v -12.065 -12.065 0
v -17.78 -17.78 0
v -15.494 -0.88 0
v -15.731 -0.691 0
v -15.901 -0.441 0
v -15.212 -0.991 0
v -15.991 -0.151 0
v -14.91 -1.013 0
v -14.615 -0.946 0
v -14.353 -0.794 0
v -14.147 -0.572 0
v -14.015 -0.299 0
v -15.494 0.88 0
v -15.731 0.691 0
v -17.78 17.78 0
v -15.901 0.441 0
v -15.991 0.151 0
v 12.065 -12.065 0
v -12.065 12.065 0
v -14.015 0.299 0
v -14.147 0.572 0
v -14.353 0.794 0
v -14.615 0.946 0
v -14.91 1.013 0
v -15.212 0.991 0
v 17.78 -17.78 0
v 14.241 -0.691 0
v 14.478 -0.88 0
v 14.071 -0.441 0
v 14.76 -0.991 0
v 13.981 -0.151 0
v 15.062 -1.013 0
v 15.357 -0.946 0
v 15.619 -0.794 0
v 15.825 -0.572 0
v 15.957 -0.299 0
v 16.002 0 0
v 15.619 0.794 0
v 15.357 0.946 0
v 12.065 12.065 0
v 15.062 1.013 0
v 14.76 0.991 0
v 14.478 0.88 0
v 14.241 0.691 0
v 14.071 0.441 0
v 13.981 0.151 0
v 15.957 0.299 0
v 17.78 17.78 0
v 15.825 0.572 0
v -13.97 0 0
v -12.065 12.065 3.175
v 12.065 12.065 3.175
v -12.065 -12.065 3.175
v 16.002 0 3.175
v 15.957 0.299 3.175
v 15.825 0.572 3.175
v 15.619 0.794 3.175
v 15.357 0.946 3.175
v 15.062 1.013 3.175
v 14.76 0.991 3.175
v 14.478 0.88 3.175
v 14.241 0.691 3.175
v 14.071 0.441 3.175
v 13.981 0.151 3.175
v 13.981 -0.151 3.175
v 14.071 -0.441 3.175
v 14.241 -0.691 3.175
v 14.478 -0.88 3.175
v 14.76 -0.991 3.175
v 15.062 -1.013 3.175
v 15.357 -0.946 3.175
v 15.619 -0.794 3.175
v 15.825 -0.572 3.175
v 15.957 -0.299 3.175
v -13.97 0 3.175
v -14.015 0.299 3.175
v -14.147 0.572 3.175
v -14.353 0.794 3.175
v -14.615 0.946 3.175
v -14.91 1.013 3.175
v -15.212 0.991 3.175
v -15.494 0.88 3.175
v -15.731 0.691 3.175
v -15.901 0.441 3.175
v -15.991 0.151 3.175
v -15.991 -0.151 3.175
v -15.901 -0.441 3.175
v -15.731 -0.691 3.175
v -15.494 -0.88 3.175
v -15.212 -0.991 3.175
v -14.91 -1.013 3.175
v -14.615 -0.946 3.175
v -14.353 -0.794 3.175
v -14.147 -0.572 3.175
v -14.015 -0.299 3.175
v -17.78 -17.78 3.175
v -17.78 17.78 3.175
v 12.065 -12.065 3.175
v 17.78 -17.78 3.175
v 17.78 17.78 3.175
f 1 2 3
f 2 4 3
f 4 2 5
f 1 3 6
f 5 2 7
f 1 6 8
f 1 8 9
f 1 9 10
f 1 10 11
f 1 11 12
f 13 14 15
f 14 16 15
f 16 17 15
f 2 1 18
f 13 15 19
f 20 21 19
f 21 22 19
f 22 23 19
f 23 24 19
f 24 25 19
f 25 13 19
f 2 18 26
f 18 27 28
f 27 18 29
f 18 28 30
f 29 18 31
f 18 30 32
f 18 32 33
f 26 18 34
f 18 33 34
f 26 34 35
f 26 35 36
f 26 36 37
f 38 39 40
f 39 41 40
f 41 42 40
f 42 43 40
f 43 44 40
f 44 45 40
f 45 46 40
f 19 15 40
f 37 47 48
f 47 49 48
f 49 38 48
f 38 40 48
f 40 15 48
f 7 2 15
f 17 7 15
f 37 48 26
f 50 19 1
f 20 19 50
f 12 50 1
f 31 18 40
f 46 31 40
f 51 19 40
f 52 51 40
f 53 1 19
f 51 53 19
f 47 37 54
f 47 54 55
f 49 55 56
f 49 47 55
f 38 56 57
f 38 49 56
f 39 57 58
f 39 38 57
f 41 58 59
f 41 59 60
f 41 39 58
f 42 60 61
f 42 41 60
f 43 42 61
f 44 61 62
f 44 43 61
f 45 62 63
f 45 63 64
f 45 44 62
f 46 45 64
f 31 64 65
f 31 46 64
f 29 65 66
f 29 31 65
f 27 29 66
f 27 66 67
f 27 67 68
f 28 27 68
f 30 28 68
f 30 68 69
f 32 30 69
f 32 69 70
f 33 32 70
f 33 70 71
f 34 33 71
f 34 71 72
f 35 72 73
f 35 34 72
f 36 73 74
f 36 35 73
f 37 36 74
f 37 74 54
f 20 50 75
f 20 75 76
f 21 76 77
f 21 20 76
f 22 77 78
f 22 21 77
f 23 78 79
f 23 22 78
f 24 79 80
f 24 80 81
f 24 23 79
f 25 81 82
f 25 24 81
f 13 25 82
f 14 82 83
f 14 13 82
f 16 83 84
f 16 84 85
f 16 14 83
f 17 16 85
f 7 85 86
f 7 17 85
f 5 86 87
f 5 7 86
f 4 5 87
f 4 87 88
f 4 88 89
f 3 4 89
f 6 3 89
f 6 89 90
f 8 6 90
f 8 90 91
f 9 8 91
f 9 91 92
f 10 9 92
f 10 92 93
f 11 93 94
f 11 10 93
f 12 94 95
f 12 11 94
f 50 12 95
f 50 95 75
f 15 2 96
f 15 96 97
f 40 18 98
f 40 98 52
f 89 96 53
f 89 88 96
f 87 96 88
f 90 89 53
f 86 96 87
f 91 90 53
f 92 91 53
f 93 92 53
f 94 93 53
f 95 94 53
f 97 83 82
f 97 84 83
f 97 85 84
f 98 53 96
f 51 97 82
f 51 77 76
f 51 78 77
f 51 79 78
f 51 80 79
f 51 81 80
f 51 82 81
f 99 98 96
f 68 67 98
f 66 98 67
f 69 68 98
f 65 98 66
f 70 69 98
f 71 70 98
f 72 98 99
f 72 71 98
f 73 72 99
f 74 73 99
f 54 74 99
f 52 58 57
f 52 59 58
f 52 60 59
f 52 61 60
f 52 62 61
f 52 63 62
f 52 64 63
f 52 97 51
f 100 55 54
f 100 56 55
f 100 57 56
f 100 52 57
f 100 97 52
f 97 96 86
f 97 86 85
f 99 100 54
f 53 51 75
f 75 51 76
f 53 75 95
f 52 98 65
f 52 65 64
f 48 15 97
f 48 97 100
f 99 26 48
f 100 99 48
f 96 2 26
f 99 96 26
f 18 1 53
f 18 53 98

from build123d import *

# Parameters (mm, degrees)
F0_W     = 35.56
F0_H     = 35.56
F0_R     = 1.016
F0_W_2   = 24.13
F0_H_2   = 24.13
F1_DEPTH = 3.175


with BuildPart() as f1:
    # F0 (on Top) → F1 (new body)
    with BuildSketch(Plane.XY):
        Rectangle(F0_W, F0_H)
        with Locations((-14.986, 0)):
            Circle(F0_R, mode=Mode.SUBTRACT)
        Rectangle(F0_W_2, F0_H_2, mode=Mode.SUBTRACT)
        with Locations((14.986, 0)):
            Circle(F0_R, mode=Mode.SUBTRACT)
    extrude(amount=F1_DEPTH)


solid = f1.part
